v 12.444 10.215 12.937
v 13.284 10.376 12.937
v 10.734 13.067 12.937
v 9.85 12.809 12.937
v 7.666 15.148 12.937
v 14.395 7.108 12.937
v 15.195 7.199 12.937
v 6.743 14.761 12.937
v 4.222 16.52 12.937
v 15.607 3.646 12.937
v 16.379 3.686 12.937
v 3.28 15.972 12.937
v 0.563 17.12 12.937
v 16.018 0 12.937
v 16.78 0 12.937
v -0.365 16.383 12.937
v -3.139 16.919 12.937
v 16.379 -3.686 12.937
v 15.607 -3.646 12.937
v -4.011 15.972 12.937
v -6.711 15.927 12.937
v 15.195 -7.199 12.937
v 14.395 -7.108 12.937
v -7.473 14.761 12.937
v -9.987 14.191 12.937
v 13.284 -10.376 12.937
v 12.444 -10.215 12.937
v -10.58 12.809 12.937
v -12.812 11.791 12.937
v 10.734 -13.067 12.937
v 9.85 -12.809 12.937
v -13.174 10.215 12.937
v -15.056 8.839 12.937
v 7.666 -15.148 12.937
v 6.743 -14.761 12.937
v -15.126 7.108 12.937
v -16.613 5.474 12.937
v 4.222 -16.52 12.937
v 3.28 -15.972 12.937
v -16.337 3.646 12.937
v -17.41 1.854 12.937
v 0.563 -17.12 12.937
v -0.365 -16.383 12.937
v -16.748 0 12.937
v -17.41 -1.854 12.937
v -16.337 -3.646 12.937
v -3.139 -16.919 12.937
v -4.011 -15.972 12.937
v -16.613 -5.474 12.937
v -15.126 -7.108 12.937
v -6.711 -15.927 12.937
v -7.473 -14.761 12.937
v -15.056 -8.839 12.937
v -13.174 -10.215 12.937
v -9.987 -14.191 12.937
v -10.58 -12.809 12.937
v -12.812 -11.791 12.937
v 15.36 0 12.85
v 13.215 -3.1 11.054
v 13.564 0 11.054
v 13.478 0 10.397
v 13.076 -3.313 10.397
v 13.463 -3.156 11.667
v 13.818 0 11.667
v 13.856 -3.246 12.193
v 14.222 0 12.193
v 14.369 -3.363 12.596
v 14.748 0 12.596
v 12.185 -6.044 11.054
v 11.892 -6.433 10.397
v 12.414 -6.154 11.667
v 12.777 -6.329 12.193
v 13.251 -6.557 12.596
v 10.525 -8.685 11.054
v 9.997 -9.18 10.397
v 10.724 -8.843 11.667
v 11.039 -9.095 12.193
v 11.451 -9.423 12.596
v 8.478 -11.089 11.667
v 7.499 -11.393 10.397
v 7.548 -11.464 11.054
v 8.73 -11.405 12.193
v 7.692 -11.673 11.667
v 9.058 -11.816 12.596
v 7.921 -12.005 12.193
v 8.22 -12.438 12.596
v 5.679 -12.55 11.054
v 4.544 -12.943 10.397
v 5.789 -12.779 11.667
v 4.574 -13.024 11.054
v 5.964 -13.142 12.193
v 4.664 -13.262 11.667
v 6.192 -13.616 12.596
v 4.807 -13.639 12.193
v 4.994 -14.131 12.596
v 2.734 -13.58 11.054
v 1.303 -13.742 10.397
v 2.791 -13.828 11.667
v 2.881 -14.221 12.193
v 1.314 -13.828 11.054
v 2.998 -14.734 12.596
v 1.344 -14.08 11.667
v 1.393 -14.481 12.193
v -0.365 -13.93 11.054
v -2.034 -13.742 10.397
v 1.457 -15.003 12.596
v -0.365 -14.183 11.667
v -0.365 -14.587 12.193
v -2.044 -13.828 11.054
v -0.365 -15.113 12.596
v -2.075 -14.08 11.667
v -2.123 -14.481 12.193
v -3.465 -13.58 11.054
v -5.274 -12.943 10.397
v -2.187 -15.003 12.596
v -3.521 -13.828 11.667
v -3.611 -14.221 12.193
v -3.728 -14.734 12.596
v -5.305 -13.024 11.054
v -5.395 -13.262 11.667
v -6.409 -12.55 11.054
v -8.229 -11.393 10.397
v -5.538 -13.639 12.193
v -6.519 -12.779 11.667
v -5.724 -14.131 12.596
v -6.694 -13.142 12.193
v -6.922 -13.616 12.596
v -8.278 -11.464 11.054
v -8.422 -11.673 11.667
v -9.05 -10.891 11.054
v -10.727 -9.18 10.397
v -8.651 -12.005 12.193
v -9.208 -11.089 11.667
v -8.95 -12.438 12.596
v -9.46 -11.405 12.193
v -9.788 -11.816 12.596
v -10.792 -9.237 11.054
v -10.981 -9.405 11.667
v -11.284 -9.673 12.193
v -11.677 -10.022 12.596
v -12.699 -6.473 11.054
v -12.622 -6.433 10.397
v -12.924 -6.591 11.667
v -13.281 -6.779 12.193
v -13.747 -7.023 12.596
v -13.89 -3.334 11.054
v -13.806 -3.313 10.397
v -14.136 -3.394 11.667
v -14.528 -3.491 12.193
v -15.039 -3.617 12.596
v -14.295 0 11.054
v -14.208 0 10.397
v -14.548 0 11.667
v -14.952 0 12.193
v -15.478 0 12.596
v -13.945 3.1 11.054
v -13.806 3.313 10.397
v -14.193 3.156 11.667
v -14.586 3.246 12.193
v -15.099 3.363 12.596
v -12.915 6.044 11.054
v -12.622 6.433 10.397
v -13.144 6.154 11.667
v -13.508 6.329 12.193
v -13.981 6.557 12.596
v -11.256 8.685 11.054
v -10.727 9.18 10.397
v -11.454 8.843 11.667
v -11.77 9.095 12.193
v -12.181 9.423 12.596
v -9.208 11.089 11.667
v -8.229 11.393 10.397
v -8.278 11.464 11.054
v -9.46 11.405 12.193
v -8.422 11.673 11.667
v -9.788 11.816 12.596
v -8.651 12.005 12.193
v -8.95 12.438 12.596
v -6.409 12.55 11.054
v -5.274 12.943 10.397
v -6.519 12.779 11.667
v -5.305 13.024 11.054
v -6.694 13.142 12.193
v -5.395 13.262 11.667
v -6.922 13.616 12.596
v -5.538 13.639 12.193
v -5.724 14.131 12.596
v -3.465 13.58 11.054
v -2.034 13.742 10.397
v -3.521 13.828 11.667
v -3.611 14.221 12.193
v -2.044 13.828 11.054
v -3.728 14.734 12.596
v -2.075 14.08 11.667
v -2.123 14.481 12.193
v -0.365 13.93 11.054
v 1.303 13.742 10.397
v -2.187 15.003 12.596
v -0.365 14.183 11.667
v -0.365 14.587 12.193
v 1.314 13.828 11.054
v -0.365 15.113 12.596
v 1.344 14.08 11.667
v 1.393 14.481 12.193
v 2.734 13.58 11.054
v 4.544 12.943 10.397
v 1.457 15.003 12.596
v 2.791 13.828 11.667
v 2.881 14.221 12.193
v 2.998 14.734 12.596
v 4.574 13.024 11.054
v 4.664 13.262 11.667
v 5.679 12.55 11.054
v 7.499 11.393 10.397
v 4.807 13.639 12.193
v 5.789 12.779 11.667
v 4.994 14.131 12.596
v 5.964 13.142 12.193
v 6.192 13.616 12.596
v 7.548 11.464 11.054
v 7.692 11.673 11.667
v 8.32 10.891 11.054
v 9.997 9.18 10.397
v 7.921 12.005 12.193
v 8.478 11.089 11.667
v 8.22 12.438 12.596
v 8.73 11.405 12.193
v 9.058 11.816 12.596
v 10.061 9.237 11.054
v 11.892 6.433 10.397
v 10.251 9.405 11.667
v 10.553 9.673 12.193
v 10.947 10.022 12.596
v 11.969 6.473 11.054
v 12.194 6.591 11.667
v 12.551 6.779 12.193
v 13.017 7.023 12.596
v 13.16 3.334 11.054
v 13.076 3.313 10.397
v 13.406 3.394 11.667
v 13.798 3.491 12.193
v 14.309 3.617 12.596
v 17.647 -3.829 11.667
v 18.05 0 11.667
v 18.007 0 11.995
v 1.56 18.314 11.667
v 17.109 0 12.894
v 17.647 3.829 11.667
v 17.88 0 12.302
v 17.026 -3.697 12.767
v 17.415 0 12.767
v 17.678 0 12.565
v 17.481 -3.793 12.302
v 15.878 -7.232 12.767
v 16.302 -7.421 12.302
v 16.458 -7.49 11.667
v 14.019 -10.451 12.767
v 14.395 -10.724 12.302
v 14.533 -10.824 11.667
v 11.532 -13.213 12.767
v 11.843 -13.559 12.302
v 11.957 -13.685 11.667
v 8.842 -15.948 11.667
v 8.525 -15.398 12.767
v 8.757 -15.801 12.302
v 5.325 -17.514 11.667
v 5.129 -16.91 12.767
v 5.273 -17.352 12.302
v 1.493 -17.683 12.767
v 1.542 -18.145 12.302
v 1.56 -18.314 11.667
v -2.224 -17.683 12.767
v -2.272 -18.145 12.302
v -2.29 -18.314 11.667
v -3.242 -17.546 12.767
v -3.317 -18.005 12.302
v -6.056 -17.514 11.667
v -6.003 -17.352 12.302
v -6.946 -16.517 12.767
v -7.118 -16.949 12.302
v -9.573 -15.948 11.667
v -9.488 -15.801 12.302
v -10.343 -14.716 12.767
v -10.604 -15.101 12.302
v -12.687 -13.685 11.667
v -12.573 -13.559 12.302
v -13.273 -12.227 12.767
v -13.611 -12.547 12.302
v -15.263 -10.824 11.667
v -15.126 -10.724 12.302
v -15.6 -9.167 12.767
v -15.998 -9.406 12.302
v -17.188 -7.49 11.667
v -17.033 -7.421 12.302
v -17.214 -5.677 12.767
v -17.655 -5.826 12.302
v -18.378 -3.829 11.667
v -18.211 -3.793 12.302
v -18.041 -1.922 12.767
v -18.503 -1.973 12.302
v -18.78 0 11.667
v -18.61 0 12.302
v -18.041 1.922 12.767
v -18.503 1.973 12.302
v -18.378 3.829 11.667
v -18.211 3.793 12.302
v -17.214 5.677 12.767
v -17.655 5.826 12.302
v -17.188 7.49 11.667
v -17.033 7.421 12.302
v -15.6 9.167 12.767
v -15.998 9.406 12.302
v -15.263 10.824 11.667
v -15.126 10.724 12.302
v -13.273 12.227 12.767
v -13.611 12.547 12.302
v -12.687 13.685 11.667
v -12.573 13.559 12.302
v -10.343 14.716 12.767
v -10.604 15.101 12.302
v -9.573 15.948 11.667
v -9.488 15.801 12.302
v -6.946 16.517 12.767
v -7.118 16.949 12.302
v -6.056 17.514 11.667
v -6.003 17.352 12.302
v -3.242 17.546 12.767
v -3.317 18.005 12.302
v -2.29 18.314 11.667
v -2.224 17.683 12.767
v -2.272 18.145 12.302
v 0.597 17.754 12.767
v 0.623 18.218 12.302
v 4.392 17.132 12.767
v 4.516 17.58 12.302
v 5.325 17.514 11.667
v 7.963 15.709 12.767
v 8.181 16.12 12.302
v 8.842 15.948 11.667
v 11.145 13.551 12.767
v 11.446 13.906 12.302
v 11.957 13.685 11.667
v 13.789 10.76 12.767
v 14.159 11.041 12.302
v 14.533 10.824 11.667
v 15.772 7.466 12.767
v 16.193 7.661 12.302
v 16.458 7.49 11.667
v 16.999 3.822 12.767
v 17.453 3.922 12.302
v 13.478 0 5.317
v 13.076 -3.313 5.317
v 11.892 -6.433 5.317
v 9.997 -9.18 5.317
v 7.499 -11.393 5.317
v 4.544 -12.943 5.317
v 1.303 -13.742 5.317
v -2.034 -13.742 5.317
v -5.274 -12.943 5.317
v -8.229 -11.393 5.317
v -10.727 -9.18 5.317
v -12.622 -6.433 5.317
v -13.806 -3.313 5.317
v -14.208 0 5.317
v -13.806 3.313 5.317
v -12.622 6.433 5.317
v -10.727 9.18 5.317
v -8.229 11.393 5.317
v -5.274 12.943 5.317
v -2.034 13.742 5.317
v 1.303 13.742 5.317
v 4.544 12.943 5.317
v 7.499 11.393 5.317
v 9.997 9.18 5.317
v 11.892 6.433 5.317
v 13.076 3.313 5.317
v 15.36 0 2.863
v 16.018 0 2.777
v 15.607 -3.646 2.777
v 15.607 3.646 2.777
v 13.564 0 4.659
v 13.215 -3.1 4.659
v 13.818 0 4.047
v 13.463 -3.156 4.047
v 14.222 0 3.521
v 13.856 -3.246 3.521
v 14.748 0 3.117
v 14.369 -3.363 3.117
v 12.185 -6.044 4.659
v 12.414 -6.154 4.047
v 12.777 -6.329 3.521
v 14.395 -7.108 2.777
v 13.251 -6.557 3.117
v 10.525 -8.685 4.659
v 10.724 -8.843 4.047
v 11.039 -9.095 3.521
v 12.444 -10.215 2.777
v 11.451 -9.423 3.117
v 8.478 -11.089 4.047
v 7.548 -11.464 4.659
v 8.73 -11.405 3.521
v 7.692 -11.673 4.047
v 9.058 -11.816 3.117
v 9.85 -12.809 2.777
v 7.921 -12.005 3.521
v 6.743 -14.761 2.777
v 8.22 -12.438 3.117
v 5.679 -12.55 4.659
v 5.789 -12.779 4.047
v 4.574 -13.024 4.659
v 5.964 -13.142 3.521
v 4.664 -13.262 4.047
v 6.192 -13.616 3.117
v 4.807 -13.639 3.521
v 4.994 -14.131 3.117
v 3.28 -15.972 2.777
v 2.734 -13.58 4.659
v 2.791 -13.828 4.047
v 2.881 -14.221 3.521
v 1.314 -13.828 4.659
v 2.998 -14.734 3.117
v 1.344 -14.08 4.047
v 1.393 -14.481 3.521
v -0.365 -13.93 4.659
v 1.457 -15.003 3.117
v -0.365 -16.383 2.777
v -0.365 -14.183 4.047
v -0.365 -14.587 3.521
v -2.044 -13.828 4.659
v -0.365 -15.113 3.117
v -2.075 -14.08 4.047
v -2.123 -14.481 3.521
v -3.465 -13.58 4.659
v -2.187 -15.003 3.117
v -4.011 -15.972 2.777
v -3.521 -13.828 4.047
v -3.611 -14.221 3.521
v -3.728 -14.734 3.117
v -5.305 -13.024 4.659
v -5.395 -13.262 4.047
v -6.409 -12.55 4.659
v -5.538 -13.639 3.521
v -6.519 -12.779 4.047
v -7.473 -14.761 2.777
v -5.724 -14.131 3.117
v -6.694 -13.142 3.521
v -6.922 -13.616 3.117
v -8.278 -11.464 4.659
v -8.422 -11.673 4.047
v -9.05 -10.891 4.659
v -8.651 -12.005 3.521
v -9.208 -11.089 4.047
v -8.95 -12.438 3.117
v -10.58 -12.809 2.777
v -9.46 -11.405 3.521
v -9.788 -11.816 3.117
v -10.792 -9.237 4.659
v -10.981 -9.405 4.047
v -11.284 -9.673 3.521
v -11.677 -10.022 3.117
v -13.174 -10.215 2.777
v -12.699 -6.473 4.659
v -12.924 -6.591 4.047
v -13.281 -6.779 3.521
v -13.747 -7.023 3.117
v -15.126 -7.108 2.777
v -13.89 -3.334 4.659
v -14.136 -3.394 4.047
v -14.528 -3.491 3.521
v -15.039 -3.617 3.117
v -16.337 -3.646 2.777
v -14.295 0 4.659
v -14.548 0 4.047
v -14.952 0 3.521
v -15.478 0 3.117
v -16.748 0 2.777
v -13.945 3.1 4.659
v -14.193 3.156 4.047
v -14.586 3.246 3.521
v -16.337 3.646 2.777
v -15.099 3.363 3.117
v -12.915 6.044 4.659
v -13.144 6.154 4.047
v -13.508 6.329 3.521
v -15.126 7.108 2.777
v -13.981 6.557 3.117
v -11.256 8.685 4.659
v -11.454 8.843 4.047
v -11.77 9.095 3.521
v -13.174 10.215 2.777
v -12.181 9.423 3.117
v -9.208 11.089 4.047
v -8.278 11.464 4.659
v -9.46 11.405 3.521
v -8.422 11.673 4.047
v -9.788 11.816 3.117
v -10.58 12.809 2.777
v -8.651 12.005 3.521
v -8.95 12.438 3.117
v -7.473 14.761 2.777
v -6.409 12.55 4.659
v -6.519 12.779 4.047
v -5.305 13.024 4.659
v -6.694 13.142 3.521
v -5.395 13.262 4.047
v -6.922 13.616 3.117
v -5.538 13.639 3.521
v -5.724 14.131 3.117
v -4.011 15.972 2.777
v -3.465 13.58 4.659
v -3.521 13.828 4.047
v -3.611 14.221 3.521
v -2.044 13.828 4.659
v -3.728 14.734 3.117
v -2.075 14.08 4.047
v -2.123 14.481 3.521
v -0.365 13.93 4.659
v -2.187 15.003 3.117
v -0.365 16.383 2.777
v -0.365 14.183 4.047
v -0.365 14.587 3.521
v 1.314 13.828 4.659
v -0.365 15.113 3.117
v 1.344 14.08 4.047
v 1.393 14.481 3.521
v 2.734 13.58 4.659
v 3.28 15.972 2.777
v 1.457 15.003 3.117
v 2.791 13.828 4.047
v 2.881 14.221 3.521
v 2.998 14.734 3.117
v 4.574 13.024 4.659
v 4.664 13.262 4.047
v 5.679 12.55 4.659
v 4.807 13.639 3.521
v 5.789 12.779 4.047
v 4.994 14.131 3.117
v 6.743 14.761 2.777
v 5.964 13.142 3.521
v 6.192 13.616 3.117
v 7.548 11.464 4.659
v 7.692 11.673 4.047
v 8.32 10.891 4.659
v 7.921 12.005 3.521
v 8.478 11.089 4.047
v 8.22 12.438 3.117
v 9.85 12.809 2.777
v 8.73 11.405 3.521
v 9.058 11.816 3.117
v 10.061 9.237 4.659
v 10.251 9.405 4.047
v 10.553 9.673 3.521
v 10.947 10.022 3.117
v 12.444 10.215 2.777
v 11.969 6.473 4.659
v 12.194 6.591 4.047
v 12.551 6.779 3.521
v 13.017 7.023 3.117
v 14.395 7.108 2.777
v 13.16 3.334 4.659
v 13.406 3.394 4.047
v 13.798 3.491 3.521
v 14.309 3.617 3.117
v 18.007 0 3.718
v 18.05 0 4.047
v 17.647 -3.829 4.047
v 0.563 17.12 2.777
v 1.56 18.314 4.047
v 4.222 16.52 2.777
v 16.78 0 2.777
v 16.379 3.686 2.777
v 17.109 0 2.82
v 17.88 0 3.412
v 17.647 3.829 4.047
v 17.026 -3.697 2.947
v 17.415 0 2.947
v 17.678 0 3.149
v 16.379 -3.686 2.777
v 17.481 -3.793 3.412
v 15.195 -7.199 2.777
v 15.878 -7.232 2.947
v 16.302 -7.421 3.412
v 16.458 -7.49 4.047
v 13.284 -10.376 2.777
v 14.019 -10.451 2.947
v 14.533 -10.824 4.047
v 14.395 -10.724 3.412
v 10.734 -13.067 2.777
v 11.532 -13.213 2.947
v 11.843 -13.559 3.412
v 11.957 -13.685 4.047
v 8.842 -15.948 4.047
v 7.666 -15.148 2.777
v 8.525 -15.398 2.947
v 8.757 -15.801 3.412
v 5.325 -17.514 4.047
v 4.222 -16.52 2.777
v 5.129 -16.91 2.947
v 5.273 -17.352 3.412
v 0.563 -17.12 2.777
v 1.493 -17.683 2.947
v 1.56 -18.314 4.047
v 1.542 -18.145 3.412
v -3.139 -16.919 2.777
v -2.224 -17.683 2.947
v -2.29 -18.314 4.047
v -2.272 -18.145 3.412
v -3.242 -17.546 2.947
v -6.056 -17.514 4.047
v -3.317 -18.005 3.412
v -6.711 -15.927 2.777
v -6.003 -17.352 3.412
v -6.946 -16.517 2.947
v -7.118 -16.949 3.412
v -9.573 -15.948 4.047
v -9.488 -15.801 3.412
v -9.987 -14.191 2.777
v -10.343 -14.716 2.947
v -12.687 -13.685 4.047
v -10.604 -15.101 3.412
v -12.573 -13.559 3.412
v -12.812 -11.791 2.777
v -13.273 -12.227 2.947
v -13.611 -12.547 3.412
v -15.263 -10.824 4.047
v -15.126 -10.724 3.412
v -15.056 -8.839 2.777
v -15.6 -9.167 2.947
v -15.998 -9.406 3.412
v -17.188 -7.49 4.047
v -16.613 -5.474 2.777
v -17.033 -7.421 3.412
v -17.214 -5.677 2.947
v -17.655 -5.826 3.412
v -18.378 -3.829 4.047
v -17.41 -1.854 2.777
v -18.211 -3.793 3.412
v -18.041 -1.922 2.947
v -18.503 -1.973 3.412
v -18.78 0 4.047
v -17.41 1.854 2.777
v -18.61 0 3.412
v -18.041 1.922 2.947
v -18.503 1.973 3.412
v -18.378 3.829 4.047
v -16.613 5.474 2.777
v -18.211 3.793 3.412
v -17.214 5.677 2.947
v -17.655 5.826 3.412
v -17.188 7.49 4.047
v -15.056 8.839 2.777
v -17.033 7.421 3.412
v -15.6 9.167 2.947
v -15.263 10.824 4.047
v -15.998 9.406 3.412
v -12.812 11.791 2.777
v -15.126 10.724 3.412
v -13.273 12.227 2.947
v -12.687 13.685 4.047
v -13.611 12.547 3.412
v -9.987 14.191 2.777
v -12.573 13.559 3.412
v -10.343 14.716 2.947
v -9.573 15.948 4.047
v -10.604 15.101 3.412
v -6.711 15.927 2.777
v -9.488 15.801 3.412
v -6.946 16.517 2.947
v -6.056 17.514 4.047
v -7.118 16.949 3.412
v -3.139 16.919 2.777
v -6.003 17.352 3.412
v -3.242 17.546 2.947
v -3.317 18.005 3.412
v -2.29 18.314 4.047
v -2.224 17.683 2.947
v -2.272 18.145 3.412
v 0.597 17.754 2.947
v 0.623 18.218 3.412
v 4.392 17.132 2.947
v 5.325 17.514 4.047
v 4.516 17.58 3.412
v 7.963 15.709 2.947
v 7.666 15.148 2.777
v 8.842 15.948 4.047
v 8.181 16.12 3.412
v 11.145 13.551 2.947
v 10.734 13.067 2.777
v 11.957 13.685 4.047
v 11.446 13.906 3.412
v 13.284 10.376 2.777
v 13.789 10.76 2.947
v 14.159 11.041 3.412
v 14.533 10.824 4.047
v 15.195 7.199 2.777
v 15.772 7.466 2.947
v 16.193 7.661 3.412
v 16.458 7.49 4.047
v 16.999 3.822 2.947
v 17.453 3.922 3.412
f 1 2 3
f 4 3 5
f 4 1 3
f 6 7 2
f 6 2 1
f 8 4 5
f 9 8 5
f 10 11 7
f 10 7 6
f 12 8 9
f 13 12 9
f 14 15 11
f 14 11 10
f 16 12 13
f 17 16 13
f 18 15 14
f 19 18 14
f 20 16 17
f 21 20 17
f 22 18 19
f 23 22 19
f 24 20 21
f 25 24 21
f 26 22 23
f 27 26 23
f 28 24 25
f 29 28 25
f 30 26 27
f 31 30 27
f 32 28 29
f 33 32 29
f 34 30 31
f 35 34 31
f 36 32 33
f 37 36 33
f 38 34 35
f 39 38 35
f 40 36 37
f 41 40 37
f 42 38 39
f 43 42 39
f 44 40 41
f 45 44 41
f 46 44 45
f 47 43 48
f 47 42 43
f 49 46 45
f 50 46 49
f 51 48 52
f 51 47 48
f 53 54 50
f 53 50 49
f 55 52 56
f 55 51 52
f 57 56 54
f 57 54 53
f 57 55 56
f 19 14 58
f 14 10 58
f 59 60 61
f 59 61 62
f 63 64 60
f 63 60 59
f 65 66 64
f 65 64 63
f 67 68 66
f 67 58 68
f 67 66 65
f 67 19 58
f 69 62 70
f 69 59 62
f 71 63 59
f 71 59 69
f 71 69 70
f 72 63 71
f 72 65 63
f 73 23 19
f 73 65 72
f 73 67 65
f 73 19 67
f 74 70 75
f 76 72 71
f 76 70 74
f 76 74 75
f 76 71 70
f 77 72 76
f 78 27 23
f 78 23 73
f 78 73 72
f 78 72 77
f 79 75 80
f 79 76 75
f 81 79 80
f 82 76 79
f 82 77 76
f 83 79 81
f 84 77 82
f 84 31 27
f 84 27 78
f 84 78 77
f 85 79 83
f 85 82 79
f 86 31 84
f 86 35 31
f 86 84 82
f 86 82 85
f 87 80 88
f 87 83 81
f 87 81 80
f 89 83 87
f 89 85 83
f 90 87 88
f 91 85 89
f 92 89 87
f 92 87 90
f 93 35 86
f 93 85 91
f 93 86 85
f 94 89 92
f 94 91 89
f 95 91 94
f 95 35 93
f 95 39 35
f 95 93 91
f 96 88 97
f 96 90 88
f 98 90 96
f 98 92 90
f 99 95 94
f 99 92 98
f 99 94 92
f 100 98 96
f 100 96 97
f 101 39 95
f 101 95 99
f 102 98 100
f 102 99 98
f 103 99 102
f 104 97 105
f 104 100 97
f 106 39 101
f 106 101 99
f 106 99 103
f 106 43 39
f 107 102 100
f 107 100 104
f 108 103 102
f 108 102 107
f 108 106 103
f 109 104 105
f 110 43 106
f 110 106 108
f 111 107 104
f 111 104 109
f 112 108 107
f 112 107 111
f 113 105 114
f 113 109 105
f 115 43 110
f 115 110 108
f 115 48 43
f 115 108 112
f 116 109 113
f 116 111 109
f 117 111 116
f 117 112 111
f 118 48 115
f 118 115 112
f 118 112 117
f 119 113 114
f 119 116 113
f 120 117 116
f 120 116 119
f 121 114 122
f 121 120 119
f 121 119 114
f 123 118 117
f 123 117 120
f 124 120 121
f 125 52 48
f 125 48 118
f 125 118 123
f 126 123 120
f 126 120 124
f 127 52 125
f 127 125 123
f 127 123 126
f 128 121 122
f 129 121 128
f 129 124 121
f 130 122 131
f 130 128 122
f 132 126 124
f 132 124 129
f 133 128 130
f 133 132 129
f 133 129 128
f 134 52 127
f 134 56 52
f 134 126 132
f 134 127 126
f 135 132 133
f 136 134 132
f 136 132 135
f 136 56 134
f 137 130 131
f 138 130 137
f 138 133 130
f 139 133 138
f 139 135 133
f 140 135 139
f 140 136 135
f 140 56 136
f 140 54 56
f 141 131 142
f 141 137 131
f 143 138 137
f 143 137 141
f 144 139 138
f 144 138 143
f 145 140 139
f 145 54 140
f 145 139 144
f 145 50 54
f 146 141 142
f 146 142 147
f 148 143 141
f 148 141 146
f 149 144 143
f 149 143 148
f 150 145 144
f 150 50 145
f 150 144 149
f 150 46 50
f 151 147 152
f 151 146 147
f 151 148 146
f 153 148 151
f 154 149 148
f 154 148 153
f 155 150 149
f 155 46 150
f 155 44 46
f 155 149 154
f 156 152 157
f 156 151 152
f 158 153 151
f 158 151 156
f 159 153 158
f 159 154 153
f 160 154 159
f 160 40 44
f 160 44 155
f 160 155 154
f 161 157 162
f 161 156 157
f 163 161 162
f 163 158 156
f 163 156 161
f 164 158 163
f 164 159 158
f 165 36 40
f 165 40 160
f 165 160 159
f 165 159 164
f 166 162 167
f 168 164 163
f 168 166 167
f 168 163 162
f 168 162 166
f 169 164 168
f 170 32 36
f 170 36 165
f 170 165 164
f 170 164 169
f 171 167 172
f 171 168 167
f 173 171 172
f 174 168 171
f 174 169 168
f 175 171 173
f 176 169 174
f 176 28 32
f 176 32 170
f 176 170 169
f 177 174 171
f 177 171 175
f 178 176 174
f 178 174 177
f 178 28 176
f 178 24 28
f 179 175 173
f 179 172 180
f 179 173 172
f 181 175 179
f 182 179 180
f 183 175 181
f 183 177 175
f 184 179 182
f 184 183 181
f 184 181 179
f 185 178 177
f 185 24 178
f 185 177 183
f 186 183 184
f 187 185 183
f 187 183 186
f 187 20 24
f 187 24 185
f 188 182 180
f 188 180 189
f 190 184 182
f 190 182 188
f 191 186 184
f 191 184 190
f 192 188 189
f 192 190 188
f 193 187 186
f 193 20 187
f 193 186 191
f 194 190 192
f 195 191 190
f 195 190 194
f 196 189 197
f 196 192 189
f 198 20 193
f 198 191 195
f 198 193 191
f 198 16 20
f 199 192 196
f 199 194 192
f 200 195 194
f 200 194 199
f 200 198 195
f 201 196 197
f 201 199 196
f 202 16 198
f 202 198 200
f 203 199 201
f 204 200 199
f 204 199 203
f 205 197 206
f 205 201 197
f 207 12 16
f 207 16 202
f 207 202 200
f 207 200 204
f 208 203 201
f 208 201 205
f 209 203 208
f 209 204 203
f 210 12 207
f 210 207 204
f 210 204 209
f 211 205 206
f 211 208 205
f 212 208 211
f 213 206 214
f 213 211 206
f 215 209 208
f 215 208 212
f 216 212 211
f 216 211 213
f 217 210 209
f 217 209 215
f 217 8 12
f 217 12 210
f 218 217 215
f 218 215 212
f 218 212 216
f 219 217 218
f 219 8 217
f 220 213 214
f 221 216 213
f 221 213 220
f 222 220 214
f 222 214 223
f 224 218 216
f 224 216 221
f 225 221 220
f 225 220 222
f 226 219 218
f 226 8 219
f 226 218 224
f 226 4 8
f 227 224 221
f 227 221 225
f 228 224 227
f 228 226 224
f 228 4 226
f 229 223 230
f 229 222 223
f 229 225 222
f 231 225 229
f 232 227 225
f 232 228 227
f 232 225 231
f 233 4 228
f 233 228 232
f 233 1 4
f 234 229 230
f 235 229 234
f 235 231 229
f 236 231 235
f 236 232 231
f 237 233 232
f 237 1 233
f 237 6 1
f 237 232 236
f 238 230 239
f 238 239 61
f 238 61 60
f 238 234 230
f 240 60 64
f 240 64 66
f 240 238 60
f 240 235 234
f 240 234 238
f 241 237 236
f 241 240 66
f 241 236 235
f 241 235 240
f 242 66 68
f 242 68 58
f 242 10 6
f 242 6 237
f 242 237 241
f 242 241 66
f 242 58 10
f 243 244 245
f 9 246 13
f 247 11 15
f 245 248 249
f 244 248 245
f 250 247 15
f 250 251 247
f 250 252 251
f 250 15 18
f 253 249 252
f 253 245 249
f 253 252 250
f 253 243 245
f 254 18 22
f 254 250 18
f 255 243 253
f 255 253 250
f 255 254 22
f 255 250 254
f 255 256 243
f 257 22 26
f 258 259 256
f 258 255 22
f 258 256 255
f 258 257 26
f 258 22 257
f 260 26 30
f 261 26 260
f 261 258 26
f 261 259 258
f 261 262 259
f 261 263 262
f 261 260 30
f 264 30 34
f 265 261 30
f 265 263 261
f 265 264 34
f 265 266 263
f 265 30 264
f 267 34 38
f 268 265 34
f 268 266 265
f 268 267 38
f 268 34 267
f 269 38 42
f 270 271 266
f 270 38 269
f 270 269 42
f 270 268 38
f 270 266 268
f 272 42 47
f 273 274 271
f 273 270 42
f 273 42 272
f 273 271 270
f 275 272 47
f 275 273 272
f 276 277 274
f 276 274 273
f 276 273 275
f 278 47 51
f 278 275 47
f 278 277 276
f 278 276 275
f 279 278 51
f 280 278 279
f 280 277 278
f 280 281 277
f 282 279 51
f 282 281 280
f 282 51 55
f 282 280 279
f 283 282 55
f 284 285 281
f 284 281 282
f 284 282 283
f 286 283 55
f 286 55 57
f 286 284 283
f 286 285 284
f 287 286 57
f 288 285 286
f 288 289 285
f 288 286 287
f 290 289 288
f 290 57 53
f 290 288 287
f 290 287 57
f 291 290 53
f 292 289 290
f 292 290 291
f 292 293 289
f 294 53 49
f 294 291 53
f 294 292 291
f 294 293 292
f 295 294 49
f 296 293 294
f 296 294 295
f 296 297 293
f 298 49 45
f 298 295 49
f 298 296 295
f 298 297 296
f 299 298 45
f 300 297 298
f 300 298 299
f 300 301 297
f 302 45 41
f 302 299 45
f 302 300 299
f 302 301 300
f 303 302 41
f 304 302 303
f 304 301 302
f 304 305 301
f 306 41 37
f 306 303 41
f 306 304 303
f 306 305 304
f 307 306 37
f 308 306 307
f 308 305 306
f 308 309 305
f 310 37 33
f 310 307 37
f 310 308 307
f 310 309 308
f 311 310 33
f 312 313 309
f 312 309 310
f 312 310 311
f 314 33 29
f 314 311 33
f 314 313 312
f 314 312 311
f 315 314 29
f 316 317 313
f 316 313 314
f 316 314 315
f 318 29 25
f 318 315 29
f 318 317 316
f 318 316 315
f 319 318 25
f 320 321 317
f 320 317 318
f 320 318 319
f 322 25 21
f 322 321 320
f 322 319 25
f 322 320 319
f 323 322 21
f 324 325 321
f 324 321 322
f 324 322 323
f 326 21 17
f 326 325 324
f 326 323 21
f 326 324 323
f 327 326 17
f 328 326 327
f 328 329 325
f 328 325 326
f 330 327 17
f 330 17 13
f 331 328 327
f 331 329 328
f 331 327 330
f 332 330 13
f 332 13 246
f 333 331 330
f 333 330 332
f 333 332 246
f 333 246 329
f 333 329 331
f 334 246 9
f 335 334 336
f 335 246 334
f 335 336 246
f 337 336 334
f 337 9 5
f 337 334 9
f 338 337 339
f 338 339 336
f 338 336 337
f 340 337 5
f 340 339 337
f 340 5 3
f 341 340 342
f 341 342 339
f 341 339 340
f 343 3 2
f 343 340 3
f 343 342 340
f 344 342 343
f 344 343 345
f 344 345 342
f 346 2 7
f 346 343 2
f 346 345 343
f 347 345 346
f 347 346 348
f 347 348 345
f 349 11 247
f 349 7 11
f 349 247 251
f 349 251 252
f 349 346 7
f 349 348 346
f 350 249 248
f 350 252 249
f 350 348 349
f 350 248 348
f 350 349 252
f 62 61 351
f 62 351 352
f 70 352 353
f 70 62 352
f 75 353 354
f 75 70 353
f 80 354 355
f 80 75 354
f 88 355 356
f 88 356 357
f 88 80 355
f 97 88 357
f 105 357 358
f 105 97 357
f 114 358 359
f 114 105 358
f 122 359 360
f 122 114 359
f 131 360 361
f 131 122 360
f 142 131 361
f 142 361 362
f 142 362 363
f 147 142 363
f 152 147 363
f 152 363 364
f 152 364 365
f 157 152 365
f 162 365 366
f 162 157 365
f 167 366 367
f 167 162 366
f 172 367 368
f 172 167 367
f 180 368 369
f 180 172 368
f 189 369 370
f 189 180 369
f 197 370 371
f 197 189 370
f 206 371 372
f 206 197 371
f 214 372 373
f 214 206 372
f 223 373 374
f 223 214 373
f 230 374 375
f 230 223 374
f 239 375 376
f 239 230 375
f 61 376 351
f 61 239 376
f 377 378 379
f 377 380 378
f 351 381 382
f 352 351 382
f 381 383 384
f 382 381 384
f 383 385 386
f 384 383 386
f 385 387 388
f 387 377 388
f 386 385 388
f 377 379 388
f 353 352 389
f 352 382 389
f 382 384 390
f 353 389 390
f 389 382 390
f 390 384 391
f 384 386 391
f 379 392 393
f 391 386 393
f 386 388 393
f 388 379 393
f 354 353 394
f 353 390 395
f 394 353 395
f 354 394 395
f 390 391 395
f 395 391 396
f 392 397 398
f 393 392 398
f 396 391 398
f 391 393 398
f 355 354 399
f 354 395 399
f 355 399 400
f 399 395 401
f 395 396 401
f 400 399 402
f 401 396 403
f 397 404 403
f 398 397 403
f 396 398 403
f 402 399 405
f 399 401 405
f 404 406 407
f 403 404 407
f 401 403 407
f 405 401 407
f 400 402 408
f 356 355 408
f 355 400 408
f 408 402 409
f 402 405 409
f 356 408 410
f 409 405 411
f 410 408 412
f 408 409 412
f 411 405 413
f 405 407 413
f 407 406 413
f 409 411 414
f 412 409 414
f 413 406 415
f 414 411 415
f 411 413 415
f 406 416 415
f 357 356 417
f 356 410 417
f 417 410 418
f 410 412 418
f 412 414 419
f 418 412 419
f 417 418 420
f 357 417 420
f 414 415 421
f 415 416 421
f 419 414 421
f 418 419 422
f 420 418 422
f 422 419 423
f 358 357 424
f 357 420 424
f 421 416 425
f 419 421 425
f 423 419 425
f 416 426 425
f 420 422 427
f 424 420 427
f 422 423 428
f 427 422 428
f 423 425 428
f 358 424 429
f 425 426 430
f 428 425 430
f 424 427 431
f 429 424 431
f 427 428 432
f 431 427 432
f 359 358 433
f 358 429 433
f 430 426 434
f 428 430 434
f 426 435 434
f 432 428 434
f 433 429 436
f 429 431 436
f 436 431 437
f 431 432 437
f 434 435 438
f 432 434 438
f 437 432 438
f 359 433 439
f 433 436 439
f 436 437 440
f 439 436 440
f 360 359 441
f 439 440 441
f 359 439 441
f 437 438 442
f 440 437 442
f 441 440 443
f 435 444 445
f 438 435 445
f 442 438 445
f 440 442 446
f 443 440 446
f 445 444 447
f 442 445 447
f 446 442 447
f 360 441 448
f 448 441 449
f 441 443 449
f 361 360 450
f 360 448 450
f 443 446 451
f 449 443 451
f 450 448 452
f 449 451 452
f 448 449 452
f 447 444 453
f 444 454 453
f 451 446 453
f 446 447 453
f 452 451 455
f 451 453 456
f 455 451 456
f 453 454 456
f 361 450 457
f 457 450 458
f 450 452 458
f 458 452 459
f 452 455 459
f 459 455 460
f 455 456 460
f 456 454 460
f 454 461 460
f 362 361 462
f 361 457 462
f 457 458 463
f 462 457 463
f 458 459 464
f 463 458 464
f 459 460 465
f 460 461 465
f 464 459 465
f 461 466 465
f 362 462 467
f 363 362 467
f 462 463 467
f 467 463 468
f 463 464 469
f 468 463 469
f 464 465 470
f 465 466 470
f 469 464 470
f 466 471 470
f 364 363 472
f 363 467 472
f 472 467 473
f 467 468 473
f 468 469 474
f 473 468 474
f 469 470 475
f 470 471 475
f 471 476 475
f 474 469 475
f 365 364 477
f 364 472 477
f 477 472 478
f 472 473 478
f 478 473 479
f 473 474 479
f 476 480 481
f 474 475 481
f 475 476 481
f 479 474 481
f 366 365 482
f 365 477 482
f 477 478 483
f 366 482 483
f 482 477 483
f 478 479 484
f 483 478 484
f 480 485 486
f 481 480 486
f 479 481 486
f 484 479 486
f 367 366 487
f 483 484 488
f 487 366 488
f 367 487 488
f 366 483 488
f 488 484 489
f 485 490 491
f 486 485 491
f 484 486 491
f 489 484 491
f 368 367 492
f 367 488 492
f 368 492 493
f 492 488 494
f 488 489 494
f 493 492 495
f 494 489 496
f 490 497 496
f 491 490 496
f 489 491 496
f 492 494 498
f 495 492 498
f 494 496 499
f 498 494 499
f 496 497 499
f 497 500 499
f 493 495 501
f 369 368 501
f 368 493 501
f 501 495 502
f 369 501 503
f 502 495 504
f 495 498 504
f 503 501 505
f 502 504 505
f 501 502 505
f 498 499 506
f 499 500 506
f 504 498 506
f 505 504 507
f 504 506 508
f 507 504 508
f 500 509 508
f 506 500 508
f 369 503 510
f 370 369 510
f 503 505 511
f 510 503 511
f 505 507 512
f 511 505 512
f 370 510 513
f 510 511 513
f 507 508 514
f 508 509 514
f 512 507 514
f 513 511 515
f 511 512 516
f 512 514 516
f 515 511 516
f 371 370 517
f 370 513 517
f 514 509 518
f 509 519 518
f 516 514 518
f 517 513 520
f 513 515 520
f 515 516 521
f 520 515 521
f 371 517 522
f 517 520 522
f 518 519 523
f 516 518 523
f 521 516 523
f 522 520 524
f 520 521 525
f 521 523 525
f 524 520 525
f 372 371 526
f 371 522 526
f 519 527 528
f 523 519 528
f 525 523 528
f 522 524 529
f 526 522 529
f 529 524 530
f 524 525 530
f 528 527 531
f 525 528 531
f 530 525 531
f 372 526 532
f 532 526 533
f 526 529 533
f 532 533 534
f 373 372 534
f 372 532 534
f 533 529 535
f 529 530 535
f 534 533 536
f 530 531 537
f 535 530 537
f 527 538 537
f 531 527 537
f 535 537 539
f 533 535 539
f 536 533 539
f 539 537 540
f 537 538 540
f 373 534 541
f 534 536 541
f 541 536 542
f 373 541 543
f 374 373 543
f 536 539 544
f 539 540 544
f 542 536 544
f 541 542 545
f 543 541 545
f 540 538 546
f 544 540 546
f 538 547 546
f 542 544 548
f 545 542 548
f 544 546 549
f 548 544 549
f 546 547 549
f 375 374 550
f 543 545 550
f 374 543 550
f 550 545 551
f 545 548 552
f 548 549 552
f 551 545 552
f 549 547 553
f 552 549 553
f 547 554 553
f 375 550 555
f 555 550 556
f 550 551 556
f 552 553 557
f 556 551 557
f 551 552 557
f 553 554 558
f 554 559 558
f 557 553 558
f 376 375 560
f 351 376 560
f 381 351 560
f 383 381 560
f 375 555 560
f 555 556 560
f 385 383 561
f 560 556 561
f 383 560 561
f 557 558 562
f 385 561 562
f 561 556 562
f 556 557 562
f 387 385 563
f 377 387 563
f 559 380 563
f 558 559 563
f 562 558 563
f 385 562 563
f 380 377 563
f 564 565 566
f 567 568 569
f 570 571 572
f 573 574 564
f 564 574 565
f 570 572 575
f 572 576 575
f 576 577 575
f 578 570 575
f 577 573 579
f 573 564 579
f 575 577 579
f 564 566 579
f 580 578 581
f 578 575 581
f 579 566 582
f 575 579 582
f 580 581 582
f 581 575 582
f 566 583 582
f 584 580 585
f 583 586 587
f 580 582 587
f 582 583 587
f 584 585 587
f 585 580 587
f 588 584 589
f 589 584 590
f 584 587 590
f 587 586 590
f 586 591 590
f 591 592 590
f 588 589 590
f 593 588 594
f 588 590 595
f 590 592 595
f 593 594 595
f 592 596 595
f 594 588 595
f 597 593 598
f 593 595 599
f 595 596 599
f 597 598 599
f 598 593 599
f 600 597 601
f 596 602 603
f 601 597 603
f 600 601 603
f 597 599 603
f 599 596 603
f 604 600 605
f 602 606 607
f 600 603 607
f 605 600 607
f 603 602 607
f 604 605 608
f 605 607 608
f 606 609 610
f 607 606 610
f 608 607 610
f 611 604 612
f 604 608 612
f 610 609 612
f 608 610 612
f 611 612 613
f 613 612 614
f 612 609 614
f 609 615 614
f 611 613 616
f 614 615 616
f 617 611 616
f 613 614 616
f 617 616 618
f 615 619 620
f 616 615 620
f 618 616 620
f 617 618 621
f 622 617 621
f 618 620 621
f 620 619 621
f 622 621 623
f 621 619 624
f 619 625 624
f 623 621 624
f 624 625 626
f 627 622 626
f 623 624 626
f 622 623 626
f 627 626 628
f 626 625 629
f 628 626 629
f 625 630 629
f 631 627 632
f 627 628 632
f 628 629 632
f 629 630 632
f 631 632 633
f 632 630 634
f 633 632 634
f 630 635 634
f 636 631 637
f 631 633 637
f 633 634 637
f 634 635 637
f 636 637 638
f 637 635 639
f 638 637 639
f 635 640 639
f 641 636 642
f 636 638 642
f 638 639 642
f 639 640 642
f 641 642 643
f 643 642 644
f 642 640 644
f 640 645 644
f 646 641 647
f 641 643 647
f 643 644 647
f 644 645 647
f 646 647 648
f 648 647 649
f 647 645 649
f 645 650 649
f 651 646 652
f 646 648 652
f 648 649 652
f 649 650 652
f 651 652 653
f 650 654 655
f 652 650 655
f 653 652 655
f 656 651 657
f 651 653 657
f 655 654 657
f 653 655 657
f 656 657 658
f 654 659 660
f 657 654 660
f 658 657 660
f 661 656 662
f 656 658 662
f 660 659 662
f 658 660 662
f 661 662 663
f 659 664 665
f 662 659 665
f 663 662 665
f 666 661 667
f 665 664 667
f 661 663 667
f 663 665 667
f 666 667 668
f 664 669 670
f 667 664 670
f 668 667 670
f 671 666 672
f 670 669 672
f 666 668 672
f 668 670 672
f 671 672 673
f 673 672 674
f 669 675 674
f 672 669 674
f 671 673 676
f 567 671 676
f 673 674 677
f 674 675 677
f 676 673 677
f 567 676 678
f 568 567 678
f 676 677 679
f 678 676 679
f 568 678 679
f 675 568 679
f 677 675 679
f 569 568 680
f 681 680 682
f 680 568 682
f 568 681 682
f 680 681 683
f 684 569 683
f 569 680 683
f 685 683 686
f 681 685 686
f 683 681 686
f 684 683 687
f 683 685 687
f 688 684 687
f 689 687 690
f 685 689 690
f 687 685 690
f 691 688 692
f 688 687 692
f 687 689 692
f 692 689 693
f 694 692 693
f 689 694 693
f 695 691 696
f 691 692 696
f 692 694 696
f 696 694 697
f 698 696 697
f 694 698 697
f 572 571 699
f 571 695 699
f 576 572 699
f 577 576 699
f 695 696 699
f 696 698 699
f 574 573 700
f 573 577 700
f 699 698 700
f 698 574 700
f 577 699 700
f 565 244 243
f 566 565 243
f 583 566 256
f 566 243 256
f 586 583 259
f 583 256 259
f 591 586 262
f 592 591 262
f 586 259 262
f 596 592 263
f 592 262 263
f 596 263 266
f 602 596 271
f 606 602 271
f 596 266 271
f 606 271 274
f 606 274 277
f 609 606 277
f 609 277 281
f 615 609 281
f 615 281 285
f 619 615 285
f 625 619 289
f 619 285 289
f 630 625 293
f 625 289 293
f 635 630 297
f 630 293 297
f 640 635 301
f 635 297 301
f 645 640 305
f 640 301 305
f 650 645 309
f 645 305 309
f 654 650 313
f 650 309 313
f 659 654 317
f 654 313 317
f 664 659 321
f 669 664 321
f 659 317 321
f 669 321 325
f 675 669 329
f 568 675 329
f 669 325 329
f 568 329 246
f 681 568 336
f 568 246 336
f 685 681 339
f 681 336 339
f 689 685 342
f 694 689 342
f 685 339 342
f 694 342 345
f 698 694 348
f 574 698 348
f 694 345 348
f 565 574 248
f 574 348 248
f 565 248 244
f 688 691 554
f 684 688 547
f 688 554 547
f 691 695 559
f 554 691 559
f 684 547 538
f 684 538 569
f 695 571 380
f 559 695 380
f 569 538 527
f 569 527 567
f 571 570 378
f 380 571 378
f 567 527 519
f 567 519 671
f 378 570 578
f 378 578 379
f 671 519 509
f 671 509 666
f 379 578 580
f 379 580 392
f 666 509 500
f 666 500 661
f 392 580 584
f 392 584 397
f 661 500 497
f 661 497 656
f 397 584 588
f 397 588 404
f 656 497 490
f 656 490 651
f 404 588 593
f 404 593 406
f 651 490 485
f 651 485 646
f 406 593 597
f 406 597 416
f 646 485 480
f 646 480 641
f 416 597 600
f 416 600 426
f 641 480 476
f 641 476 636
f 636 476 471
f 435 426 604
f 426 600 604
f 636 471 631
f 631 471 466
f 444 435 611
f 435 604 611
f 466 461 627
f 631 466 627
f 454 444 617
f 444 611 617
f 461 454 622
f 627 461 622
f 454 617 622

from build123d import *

# Parameters (mm, degrees)
F0_W = 4.572
F0_H = 10.16
F2_R = 2.54
F3_R = 1.27


with BuildPart() as f1:
    # F0 (on Front) → F1 (revolve)
    with BuildSketch(Plane.XZ):
        with Locations((15.7638760562, 7.8567868348)):
            Rectangle(F0_W, F0_H)
    revolve(axis=Axis((-0.3651239438, 0, 7.8567868348), (0, 0, -1)))

    # F2
    f2_edges = [f1.edges().sort_by_distance(p)[0] for p in [
        (-14.208124, 0, 12.936787),
        (-14.208124, 0, 2.776787),
    ]]
    fillet(f2_edges, radius=F2_R)

    # F3
    f3_edges = [f1.edges().sort_by_distance(p)[0] for p in [
        (-18.780124, 0, 12.936787),
        (-18.780124, 0, 2.776787),
    ]]
    fillet(f3_edges, radius=F3_R)


solid = f1.part
